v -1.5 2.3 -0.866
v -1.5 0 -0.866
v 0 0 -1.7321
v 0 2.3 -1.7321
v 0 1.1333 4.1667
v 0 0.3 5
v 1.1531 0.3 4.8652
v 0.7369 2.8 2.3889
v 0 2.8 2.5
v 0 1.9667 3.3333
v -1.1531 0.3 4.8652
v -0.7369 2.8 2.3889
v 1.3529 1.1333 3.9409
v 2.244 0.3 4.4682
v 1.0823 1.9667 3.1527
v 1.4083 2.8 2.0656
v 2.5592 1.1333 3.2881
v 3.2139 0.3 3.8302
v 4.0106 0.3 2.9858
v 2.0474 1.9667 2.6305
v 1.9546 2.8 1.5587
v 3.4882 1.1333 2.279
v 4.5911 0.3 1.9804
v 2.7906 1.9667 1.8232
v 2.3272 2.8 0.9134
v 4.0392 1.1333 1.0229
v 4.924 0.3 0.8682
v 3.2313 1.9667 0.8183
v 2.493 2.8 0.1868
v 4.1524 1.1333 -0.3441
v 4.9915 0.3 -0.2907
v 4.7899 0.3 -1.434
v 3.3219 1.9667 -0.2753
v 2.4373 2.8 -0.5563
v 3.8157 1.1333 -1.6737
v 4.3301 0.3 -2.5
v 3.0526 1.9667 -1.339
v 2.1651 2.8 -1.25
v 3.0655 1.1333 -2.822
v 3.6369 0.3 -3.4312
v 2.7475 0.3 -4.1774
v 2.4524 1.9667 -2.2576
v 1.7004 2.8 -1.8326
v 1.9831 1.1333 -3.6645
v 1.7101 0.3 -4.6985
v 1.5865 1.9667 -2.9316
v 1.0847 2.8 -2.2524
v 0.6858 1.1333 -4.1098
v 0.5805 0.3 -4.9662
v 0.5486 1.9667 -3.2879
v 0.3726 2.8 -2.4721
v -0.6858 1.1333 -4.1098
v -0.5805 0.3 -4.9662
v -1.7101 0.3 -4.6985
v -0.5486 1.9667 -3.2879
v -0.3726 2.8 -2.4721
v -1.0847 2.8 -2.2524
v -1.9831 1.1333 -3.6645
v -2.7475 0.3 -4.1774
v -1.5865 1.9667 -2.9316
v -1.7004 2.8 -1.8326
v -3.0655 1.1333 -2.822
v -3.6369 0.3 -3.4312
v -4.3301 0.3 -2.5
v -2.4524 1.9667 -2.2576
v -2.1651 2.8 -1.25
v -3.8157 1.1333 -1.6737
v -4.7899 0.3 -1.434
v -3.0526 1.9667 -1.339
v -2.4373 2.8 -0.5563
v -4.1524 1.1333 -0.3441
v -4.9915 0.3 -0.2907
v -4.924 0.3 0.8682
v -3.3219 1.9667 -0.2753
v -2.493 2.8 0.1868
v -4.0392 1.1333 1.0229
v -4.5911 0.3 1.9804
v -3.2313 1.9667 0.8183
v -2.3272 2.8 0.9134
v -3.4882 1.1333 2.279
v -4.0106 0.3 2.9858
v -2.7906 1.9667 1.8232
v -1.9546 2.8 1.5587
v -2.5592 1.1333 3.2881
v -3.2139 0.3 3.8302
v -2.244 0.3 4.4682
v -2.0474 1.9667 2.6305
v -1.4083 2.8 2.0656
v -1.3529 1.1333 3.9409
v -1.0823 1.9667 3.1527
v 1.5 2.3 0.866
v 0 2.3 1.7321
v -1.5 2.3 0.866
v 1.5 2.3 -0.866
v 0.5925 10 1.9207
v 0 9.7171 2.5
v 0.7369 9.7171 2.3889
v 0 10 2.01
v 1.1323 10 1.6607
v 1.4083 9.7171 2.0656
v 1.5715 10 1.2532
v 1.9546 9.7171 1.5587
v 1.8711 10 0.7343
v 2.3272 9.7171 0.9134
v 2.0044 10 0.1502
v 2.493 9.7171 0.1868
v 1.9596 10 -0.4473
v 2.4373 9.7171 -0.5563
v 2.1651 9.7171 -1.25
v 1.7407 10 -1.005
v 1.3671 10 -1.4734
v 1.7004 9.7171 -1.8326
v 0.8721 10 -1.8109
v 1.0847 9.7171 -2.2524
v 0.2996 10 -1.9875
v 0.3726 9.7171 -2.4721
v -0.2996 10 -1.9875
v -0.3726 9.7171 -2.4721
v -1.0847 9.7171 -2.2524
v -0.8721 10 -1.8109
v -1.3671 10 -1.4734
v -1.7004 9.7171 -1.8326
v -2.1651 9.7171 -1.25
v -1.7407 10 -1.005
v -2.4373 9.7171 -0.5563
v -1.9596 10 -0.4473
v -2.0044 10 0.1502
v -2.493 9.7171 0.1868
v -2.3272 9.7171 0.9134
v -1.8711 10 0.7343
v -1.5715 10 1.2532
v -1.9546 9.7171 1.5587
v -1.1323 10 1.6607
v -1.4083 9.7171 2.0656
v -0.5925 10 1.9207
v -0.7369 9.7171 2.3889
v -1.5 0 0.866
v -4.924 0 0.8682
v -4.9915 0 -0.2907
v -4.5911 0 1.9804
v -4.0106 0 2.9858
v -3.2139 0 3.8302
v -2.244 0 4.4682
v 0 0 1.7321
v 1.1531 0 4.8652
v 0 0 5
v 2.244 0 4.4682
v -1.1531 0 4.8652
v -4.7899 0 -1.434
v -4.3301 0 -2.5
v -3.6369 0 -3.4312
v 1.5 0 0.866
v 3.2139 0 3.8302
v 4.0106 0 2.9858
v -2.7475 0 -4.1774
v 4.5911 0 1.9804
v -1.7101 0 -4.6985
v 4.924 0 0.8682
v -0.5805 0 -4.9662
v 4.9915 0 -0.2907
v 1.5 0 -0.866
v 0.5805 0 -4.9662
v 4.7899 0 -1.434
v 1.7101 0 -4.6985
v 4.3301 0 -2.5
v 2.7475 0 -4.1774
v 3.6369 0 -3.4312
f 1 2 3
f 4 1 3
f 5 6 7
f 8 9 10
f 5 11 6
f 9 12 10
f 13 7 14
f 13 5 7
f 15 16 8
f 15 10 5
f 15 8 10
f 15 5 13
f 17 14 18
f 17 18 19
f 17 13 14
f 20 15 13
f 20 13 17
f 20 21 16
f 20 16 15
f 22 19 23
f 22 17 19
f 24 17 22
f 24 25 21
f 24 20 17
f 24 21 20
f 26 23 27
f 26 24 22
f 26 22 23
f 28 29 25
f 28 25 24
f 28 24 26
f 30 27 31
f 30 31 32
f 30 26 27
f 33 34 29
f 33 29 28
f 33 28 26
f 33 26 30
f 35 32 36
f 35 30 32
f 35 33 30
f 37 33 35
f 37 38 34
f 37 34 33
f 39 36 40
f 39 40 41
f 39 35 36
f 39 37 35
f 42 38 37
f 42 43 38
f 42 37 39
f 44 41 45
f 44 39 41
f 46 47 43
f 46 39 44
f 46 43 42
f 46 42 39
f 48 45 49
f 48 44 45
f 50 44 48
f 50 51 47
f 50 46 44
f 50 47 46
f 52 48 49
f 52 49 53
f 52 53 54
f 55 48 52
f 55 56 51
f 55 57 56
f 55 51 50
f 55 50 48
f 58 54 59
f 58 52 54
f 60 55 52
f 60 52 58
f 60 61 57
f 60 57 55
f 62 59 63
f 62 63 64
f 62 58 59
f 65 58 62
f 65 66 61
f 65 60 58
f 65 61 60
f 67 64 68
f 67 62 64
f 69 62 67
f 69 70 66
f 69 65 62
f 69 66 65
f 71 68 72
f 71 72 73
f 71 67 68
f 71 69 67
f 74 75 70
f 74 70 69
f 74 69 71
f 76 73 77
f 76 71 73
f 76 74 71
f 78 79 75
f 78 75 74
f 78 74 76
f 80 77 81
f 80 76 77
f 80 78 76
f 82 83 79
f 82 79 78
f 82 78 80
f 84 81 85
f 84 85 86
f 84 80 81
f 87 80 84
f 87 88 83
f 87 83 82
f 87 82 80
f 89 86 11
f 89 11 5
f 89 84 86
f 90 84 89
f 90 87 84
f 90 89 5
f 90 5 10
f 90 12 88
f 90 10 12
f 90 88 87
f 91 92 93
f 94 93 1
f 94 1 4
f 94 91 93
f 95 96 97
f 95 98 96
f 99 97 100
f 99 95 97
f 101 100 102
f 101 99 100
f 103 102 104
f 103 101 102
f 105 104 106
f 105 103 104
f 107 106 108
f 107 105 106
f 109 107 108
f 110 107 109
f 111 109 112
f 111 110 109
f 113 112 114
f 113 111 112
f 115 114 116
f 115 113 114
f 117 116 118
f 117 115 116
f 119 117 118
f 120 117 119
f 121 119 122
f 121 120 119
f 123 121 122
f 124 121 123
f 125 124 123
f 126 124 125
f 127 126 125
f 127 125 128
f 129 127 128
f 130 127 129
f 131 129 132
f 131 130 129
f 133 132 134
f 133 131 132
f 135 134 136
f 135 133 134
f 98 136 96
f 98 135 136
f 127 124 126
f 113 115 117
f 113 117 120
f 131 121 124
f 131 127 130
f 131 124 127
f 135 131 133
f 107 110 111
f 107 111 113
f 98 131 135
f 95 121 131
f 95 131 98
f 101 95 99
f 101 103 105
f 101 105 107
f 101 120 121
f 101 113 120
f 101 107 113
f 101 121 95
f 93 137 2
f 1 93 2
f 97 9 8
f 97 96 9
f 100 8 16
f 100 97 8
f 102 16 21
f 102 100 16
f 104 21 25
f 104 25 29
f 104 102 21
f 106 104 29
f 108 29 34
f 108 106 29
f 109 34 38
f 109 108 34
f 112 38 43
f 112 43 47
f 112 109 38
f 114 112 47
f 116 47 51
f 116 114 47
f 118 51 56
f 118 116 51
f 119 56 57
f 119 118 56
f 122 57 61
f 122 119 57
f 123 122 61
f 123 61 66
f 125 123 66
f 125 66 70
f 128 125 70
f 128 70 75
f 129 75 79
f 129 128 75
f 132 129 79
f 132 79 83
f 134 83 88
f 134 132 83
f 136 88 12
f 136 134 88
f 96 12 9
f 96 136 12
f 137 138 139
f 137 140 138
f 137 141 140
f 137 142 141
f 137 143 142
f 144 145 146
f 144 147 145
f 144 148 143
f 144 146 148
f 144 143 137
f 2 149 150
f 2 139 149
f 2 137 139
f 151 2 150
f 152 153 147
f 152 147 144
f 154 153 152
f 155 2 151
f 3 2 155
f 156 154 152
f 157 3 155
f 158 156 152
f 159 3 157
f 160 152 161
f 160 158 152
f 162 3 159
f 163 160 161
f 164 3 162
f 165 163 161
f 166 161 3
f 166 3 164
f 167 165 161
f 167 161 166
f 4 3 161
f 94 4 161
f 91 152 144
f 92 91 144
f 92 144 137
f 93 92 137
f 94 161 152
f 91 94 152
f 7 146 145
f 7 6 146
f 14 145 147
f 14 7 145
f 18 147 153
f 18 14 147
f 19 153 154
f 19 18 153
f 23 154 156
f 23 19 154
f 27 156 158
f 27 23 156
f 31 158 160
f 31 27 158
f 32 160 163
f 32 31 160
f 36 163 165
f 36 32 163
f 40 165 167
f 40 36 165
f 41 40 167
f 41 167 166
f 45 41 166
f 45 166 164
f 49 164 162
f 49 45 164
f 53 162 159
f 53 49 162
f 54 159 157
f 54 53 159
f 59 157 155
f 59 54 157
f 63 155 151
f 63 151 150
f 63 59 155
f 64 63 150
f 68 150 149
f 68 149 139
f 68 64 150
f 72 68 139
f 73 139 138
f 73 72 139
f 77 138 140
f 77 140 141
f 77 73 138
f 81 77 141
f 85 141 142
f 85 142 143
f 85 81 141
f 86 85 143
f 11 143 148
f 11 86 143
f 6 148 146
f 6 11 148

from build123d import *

# Parameters (mm, degrees)
POCKET_DEPTH = 2.3


with BuildPart() as part:
    # Sketch → Revolution (revolve)
    with BuildSketch(Plane.YZ):
        Polygon((0, 0), (0, 5), (0.3, 5), (2.8, 2.5), (9.717098, 2.5), (10, 2.01), (10, 0), align=None)
    revolve(axis=Axis((0, 0, 0), (0, 1, 0)))

    # Sketch001 → Pocket (cut)
    with BuildSketch(Plane(origin=(0, 0, 0), x_dir=(0, 0, -1), z_dir=(0, -1, 0))):
        Polygon((0.866025, 1.5), (-0.866025, 1.5), (-1.732051, 0), (-0.866025, -1.5), (0.866025, -1.5), (1.732051, 0), align=None)
    extrude(amount=-POCKET_DEPTH, mode=Mode.SUBTRACT)


solid = part.part
